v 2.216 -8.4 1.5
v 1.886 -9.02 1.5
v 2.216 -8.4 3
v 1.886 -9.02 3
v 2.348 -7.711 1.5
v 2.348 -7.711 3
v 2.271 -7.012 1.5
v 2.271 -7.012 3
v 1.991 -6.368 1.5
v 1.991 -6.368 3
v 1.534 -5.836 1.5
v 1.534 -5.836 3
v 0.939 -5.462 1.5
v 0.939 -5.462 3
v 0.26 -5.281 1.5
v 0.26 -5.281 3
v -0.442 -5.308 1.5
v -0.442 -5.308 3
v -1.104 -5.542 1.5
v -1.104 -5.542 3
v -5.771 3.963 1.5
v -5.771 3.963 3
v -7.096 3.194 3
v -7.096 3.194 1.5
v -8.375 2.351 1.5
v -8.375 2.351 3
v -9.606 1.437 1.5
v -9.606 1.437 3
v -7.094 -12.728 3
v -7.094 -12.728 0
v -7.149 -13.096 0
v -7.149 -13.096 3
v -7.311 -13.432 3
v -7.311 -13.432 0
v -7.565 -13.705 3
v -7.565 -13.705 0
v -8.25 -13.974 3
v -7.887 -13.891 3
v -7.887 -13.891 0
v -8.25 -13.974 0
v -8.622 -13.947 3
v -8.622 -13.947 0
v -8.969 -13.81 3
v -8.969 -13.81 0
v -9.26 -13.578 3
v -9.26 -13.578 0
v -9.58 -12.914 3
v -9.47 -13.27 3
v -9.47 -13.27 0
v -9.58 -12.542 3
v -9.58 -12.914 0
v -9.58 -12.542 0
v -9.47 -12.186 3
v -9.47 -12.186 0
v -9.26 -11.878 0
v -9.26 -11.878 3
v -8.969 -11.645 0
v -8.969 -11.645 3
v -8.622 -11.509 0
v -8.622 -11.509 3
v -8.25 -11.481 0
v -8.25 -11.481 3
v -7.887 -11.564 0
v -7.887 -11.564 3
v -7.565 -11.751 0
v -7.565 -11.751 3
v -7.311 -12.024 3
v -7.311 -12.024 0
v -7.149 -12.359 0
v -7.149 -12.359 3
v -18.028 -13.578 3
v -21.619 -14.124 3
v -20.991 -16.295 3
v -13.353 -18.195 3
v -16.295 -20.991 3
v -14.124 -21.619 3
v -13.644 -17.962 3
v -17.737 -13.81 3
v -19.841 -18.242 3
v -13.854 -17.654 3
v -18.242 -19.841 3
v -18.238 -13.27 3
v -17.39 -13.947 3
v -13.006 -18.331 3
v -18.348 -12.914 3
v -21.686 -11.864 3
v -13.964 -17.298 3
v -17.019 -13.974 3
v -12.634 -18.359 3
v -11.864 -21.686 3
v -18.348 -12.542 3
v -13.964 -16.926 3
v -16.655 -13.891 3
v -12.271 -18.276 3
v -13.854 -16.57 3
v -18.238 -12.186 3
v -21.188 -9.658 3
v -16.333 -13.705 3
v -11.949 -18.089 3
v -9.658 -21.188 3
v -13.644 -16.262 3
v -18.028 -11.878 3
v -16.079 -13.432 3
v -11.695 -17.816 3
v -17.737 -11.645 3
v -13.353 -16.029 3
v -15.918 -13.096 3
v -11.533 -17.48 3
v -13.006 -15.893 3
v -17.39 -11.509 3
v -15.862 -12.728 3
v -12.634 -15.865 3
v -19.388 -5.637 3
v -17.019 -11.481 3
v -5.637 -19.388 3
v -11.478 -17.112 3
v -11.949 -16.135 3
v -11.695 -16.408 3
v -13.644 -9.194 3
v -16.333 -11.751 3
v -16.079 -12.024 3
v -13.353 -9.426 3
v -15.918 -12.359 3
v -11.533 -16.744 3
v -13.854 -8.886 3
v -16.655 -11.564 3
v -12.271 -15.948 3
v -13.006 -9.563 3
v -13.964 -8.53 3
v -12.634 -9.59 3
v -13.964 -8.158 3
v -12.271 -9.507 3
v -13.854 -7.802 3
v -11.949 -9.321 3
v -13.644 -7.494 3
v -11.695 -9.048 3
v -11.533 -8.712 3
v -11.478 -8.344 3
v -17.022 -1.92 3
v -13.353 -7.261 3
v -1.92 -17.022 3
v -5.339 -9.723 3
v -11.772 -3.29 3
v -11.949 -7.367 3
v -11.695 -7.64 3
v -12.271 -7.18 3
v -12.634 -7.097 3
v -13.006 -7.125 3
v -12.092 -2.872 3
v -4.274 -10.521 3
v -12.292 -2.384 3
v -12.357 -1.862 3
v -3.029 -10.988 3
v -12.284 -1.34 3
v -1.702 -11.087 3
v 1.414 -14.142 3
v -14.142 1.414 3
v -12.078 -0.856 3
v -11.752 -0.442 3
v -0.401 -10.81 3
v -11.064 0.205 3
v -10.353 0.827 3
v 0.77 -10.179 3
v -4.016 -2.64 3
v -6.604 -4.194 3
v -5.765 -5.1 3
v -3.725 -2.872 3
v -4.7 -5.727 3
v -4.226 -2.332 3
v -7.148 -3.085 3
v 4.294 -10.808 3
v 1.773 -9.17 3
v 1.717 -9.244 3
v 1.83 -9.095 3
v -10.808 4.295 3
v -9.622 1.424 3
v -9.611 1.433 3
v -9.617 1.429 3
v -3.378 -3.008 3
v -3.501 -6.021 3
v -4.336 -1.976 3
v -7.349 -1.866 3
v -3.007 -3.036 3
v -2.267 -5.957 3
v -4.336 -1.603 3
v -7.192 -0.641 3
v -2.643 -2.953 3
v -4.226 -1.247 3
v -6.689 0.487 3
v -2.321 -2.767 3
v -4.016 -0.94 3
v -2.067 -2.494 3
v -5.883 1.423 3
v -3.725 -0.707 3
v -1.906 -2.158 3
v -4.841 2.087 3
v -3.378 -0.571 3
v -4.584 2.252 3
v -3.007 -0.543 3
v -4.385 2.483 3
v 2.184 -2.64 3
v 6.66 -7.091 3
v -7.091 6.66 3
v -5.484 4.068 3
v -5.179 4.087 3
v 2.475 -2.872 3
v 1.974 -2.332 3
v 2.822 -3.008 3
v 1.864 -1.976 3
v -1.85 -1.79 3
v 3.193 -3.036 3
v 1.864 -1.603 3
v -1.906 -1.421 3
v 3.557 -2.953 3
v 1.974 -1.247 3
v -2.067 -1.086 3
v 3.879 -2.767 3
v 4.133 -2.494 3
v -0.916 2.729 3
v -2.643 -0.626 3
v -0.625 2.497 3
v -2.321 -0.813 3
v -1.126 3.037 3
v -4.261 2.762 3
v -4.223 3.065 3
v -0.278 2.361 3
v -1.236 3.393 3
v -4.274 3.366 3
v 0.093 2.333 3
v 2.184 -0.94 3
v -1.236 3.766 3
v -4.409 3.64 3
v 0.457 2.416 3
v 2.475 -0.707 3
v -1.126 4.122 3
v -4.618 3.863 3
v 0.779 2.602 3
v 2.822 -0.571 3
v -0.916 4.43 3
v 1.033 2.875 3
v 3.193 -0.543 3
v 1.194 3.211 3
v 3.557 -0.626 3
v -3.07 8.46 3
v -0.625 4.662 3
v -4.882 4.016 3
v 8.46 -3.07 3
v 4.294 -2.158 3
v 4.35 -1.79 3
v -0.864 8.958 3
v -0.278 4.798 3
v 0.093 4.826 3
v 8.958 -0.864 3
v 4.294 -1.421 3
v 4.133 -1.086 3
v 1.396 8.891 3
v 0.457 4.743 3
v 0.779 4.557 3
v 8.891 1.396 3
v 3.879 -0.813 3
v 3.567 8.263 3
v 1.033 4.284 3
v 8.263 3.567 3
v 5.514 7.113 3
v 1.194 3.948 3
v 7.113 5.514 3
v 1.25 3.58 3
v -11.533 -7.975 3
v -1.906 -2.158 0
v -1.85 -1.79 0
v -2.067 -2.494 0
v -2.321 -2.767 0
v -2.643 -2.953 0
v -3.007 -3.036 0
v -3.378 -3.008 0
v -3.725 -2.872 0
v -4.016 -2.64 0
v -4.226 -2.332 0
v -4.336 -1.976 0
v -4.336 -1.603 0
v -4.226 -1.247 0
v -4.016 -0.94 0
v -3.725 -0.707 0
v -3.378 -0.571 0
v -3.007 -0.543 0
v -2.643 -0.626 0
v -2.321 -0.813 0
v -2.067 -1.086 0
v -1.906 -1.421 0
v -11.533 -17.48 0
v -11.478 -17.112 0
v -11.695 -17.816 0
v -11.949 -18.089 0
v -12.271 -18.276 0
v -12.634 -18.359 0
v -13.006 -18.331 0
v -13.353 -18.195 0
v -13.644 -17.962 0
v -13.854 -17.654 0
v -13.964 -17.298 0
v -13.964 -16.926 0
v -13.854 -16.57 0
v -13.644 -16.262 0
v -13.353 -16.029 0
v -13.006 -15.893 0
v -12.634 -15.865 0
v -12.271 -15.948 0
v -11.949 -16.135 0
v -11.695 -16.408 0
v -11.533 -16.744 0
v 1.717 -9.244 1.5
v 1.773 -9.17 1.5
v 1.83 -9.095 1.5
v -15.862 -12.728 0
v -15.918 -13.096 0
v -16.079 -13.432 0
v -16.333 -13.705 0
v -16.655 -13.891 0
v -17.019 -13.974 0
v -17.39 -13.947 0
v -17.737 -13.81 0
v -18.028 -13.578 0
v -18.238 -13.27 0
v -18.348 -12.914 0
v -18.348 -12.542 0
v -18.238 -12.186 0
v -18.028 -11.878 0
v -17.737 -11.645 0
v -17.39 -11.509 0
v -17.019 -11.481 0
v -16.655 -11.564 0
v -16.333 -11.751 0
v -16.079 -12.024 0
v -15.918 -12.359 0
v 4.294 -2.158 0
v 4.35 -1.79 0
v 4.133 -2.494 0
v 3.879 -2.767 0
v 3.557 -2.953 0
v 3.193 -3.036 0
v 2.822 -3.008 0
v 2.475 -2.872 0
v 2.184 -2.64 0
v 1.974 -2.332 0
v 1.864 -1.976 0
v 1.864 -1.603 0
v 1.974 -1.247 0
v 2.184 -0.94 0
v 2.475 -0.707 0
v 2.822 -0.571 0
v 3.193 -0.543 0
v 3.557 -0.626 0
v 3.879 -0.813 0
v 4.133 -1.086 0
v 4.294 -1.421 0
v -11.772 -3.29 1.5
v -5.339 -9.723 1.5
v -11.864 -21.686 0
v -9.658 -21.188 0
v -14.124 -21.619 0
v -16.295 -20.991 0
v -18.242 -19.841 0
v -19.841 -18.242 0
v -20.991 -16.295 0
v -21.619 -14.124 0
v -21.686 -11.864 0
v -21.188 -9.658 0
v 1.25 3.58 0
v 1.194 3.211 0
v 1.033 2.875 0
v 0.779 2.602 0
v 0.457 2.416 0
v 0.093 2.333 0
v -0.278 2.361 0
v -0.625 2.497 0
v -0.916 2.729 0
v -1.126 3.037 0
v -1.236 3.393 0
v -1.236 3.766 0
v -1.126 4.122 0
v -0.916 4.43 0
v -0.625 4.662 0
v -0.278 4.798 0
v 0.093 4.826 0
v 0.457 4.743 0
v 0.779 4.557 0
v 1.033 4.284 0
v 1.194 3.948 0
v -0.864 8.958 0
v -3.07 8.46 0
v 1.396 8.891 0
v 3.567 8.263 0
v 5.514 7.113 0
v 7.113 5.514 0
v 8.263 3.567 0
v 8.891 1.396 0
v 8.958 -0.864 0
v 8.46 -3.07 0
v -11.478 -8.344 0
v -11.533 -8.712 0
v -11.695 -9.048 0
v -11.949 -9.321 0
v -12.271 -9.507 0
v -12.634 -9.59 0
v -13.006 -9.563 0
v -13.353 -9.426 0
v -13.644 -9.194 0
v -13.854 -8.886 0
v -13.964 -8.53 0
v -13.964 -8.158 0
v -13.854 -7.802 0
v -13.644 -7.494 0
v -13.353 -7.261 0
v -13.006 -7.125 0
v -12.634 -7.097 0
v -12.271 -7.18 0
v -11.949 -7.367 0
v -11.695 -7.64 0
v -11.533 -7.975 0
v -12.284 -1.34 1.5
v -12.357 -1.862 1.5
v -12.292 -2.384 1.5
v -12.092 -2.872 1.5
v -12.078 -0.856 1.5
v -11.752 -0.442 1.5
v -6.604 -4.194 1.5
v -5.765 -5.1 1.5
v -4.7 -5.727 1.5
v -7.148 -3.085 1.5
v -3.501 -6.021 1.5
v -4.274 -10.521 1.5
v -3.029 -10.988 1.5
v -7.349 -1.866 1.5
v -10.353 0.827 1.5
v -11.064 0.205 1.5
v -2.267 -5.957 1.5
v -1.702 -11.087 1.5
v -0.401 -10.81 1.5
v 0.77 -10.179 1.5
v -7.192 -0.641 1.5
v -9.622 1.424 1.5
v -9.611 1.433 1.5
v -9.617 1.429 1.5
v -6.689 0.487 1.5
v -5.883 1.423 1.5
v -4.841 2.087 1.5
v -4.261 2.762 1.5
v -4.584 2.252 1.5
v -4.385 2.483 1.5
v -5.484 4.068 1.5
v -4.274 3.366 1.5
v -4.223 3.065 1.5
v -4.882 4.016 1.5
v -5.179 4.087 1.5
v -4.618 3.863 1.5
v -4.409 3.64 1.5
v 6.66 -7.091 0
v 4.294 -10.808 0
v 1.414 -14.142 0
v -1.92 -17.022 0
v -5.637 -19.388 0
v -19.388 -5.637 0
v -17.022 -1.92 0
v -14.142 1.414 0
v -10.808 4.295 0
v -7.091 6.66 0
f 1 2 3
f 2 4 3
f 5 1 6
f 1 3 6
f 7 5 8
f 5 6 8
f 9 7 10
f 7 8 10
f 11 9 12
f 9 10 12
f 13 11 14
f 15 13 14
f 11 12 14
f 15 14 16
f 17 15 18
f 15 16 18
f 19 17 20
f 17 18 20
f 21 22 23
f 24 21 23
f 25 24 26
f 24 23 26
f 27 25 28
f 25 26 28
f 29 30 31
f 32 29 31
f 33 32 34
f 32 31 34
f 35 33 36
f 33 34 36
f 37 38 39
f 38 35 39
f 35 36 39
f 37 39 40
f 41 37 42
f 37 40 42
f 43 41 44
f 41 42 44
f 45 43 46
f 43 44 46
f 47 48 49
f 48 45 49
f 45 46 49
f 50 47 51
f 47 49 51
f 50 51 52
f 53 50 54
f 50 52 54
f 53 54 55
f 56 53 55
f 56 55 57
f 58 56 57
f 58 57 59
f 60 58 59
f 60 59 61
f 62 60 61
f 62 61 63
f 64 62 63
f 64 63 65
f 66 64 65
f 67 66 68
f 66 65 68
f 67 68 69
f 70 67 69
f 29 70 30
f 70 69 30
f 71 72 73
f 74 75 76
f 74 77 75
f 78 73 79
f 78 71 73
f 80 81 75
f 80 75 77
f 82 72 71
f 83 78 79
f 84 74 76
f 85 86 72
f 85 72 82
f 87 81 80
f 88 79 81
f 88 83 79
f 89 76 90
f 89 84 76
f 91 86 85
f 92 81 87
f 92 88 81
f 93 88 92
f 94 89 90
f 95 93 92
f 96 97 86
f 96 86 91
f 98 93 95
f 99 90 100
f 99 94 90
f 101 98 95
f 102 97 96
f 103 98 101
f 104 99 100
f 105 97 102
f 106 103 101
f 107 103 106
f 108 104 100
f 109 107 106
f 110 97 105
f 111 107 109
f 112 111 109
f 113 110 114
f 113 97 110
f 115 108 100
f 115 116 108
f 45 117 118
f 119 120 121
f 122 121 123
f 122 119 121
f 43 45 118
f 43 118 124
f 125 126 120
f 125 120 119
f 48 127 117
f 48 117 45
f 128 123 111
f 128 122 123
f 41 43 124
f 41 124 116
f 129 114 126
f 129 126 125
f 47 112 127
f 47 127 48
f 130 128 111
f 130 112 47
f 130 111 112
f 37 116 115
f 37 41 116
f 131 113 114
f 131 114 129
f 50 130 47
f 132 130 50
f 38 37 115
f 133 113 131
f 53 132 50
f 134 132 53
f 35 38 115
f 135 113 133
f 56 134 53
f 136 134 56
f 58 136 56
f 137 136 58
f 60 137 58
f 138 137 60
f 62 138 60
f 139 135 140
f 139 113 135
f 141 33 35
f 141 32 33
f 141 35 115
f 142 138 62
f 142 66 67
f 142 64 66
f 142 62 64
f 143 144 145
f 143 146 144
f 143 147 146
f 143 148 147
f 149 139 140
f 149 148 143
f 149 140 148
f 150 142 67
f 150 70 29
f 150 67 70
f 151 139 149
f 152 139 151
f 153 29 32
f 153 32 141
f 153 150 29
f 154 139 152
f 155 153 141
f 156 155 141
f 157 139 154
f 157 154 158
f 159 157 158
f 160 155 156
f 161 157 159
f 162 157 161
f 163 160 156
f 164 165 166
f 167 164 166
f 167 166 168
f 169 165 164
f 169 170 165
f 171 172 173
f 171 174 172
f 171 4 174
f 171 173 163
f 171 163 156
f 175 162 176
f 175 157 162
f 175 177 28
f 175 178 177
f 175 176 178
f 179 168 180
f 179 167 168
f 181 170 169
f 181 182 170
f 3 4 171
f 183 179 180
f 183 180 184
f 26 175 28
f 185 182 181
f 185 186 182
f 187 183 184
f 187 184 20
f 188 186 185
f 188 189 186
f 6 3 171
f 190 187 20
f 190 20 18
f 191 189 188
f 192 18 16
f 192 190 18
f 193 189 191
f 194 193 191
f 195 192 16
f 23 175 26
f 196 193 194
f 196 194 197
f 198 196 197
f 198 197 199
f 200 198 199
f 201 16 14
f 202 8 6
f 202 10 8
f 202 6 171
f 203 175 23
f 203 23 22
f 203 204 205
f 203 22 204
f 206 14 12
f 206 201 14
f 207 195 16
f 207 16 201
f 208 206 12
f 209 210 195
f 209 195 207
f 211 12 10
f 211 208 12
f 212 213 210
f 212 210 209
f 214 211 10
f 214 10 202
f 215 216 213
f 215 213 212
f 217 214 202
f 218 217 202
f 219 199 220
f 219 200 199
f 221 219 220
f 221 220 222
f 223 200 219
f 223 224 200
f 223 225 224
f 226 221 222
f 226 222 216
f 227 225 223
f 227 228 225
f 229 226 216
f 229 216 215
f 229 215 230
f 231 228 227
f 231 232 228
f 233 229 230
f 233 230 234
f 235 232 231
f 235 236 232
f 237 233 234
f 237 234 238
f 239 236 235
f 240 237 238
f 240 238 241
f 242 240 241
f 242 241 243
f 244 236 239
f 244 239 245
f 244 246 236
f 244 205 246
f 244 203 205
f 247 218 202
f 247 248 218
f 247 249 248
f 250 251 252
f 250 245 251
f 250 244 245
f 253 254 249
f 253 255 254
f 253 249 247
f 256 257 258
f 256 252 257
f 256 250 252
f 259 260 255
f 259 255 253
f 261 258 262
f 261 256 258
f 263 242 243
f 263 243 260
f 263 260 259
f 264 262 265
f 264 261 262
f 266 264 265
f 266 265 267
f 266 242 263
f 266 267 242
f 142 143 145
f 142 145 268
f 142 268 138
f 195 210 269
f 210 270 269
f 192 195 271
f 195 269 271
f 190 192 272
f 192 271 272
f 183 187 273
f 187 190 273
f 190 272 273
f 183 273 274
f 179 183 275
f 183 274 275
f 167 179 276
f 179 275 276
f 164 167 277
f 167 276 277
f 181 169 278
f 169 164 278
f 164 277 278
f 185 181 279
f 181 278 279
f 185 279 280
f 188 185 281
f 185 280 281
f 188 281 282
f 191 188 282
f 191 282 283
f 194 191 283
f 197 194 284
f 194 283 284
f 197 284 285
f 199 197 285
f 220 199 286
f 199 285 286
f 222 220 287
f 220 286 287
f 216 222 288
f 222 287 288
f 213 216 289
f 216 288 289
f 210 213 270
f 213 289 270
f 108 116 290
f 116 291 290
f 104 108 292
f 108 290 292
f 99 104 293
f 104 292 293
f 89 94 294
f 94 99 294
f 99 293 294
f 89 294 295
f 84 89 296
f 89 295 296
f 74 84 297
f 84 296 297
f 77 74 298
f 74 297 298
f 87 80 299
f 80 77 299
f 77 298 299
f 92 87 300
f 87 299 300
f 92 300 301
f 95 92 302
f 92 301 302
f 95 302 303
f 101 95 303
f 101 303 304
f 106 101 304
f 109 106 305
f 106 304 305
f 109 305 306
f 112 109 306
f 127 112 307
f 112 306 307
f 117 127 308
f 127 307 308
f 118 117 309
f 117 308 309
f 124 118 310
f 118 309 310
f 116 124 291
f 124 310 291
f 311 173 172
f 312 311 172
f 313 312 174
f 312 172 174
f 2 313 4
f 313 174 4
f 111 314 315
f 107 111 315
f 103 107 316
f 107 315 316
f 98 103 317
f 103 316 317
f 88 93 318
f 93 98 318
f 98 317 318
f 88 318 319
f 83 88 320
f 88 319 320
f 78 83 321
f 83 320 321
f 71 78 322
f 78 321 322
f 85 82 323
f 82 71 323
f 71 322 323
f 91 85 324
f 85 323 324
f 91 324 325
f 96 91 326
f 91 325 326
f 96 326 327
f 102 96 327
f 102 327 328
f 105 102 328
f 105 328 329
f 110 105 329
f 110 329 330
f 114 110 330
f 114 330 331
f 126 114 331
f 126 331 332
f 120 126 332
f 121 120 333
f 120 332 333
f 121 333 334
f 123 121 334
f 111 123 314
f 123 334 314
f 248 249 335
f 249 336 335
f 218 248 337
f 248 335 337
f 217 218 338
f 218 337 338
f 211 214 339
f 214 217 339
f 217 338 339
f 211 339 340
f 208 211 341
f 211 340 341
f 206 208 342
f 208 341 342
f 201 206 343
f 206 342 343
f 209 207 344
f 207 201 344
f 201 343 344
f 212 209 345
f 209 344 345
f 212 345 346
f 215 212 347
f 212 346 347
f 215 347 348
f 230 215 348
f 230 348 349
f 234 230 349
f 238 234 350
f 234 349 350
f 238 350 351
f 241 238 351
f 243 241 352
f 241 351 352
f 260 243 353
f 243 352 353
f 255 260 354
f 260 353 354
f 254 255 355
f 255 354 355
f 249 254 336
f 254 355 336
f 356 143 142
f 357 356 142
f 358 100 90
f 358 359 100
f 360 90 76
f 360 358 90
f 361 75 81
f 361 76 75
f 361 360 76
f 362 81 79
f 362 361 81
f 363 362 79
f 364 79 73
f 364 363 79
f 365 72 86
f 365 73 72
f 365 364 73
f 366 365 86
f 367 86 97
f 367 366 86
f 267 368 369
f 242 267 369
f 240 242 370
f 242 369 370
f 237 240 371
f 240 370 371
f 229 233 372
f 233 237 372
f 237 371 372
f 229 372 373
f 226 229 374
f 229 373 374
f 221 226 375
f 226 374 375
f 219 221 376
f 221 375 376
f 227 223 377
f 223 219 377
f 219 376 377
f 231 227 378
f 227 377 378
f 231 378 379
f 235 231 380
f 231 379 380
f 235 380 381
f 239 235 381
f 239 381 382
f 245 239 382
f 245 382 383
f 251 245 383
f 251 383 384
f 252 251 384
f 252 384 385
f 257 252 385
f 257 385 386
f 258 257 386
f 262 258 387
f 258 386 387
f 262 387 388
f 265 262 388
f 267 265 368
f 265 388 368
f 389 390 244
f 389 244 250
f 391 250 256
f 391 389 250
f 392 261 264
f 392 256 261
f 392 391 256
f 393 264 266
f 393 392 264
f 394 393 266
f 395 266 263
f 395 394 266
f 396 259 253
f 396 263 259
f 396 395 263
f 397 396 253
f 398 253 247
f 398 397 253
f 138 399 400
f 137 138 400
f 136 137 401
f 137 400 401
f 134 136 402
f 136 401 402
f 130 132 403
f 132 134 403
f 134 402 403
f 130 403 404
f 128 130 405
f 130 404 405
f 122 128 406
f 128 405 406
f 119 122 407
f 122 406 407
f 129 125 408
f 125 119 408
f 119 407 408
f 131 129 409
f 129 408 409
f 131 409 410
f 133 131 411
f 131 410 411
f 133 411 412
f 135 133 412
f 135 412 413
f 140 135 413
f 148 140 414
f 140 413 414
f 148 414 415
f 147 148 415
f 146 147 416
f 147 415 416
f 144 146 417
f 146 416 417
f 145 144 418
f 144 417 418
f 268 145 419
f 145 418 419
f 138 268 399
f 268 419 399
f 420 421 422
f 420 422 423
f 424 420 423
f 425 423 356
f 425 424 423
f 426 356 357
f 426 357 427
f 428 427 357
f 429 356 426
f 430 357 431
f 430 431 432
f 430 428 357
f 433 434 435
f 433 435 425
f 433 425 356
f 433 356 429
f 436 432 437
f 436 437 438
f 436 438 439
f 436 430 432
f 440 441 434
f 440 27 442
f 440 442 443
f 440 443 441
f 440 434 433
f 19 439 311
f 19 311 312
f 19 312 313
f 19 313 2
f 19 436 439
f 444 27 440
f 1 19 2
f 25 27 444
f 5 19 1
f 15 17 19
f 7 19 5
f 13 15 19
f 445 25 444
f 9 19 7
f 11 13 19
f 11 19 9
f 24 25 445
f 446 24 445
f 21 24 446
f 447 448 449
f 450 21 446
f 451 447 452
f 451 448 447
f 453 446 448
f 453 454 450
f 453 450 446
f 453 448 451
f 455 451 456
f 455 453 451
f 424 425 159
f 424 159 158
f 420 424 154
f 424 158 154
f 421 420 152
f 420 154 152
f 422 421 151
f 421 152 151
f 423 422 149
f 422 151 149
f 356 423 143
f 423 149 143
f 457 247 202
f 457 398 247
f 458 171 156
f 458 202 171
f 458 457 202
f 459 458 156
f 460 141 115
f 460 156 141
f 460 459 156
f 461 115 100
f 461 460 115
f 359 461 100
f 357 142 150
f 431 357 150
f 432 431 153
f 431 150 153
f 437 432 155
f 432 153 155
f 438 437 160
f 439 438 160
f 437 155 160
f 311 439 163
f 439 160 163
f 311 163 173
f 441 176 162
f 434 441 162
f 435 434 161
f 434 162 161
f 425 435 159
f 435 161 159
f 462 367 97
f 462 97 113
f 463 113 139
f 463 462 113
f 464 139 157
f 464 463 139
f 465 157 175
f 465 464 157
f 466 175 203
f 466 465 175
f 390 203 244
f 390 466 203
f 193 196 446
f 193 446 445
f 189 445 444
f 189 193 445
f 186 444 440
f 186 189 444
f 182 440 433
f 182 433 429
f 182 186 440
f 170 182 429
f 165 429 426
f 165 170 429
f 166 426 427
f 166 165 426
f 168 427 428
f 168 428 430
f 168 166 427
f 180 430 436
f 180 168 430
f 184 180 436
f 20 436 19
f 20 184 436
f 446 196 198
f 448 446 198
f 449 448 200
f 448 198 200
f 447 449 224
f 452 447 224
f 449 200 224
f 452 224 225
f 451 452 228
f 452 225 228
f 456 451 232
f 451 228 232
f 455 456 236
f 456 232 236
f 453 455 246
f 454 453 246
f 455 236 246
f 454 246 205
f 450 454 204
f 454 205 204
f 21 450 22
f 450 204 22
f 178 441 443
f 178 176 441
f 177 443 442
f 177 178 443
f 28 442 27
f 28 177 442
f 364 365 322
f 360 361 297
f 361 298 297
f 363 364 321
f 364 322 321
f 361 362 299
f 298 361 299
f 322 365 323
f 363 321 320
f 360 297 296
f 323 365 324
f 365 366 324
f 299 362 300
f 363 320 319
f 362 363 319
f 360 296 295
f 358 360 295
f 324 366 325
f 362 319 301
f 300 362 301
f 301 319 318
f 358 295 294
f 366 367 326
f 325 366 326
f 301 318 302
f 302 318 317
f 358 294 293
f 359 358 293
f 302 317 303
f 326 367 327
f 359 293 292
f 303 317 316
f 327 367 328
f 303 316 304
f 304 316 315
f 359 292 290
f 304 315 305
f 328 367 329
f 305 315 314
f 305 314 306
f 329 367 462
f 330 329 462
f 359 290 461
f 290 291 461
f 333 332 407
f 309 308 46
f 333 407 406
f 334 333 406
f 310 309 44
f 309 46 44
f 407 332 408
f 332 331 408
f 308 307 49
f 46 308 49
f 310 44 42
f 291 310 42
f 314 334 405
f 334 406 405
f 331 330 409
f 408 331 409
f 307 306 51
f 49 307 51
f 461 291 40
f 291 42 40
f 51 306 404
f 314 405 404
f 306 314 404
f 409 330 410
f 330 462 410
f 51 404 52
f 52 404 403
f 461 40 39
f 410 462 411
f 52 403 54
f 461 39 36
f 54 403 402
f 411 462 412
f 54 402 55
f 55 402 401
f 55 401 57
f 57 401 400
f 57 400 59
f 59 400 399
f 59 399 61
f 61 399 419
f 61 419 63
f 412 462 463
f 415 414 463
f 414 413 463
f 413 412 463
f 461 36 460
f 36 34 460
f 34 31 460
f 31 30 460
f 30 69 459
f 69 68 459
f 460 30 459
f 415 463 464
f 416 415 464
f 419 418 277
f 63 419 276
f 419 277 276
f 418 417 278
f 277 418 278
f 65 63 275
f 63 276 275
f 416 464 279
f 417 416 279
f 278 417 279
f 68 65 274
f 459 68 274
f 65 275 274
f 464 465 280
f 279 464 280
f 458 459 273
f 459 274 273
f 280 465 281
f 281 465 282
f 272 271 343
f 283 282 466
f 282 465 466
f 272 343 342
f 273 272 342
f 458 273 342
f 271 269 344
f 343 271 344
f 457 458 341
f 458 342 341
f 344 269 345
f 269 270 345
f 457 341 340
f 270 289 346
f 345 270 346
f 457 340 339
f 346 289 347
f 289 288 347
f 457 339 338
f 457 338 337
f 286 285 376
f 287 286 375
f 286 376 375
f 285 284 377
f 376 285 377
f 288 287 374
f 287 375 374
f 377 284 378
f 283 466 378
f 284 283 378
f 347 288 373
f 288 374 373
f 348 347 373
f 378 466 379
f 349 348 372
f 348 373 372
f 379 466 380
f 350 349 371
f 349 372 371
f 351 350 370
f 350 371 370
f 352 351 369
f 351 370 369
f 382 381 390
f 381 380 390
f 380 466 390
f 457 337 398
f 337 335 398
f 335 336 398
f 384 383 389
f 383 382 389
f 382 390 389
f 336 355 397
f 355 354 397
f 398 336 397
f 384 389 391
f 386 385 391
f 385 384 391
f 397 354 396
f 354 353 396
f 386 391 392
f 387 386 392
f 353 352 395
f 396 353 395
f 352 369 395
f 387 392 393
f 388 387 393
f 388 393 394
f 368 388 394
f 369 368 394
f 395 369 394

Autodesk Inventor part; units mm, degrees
ref_plane "YZ Plane" through (0, 0, 0) normal (1, 0, 0) x (0, 1, 0)
ref_plane "XZ Plane" through (0, 0, 0) normal (0, 1, 0) x (-1, 0, 0)
ref_plane "XY Plane" through (0, 0, 0) normal (0, 0, 1) x (1, 0, 0)
sketch "Sketch2" plane through (0, 0, 0) normal (0, 0, 1) x (1, 0, 0)
  line L0 (-12.7279, -12.7279) -> (0, 0) construction
  line L1 (-12.7279, -12.7279) -> (-7.4558, -12.7279) construction
  line L2 (-12.7279, -12.7279) -> (0, 0) construction
  line L3 (-17.252, -29.9799) -> (-9.2664, -21.9943) construction
  line L4 (-2.9446, 9.7833) -> (-10.9302, 1.7977) construction
  arc A0 (-21.1882, -9.6582) -> (-9.6582, -21.1882) centre (-12.7279, -12.7279) ccw
  arc A1 (8.4603, -3.0697) -> (-3.0697, 8.4603) centre (0, 0) ccw
  circle A2 centre (-8.3439, -12.7279) radius 1.25
  circle A3 centre (-8.3439, -12.7279) radius 3.1 construction
  circle A4 centre (-12.7279, -8.3439) radius 1.25
  circle A5 centre (-12.7279, -8.3439) radius 3.1 construction
  circle A6 centre (-17.112, -12.7279) radius 1.25
  circle A7 centre (-17.112, -12.7279) radius 3.1 construction
  circle A8 centre (-12.7279, -17.112) radius 1.25
  circle A9 centre (-12.7279, -17.112) radius 3.1 construction
  circle A10 centre (-3.1, -1.7898) radius 1.25
  circle A11 centre (-3.1, -1.7898) radius 3.1 construction
  circle A12 centre (3.1, -1.7898) radius 3.1 construction
  circle A13 centre (3.1, -1.7898) radius 1.25
  circle A14 centre (0, 3.5796) radius 3.1 construction
  circle A15 centre (0, 3.5796) radius 1.25
  arc A16 (-9.6582, -21.1882) -> (8.4603, -3.0697) centre (-19.9758, 7.2478) ccw
  line L5 (1.4142, -14.1421) -> (-6.364, -6.364) construction
  arc A17 (-3.0697, 8.4603) -> (-21.1882, -9.6582) centre (7.2478, -19.9758) ccw
  point P0 (-6.364, -6.364)
  dimension "d34" = 18
  dimension "d35" = 9
  dimension "d36" = 2.5
  dimension "d37" = 6.2
  dimension "d38" = 360
  dimension "d39" = 2.5
  dimension "d40" = 6.2
  dimension "d41" = 360
  dimension "d42" = 11
  dimension "d43" = 45
extrude "Extrusion2" add sketch "Sketch2" along normal blind 3
sketch "Sketch3" plane through (0, 0, 3) normal (0, 0, 1) x (1, 0, 0)
  circle A0 centre (-12.7279, -8.3439) radius 1.25 projected
  circle A1 centre (-8.3439, -12.7279) radius 1.25 projected
  arc A2 (-3.0697, 8.4603) -> (-21.1882, -9.6582) centre (7.2478, -19.9758) ccw projected
  arc A3 (-9.6582, -21.1882) -> (8.4603, -3.0697) centre (-19.9758, 7.2478) ccw projected
  circle A4 centre (-3.1, -1.7898) radius 1.25 projected
  circle A5 centre (3.1, -1.7898) radius 1.25 projected
  circle A6 centre (0, 3.5796) radius 1.25 projected
  arc A7 (-9.6056, 1.4374) -> (-9.622, 1.4245) centre (7.2478, -19.9758) ccw
  circle A8 centre (-12.7279, -8.3439) radius 1.25 projected
  line L0 (-11.844, -7.46) -> (-7.46, -11.844) construction
  arc A9 (1.7167, -9.2445) -> (1.8856, -9.02) centre (-19.9758, 7.2478) ccw
  line L1 (-11.7716, -3.2898) -> (-5.3387, -9.7227)
  line L2 (-5.8854, -0.7722) -> (-0.4613, -6.1962) construction
  arc A10 (1.8856, -9.02) -> (-1.1039, -5.5419) centre (0, -7.6169) ccw
  arc A11 (-5.3387, -9.7227) -> (1.7167, -9.2445) centre (-2.0197, -6.4038) ccw
  circle A12 centre (-8.3439, -12.7279) radius 4.25 construction
  circle A13 centre (-3.1, -1.7898) radius 4.25 construction
  circle A14 centre (3.1, -1.7898) radius 4.25 construction
  circle A15 centre (-12.7279, -8.3439) radius 4.25 construction
  arc A16 (-11.7519, -0.4419) -> (-11.7716, -3.2898) centre (-10.3574, -1.8755) ccw
  arc A17 (-7.1444, 3.1635) -> (-14.769, -3.9189) centre (7.2478, -19.9758) ccw construction
  arc A18 (-4.8412, 2.0872) -> (-1.1039, -5.5419) centre (-3.1, -1.7898) ccw
  arc A19 (-5.7709, 3.9632) -> (-11.7519, -0.4419) centre (7.2478, -19.9758) ccw
  arc A20 (-4.8412, 2.0872) -> (-5.7709, 3.9632) centre (-5.2704, 3.0429) ccw
  circle A21 centre (0, 3.5796) radius 4.25 construction
  point P0 (0, 0)
  point P1 (-1.1039, -5.5419)
  dimension "d46" = 3
  dimension "d49" = 3
  dimension "d52" = 3
  dimension "d53" = 3
  dimension "d54" = 3
  dimension "d55" = 3
  dimension "d56" = 3
  dimension "d59" = 3
  dimension "d60" = 2
extrude "Extrusion3" cut sketch "Sketch3" against normal blind 1.5 contours A19 A20 A18 A10 A9 A11 L1 A16 A7
sketch "sesaku" plane through (0, 0, 3) normal (0, 0, 1) x (1, 0, 0)
  arc A0 (-5.3387, -9.7227) -> (1.7167, -9.2445) centre (-2.0197, -6.4038) ccw projected
  line L0 (-5.3387, -9.7227) -> (-11.7716, -3.2898) projected
  arc A1 (-11.7519, -0.4419) -> (-11.7716, -3.2898) centre (-10.3574, -1.8755) ccw projected
  arc A2 (1.8856, -9.02) -> (-1.1039, -5.5419) centre (0, -7.6169) ccw projected
  arc A3 (1.7167, -9.2445) -> (1.8856, -9.02) centre (-19.9758, 7.2478) ccw projected
  arc A4 (-9.6582, -21.1882) -> (8.4603, -3.0697) centre (-19.9758, 7.2478) ccw projected
  arc A5 (8.4603, -3.0697) -> (-3.0697, 8.4603) centre (0, 0) ccw projected
  arc A6 (-3.0697, 8.4603) -> (-21.1882, -9.6582) centre (7.2478, -19.9758) ccw projected
  arc A7 (-21.1882, -9.6582) -> (-9.6582, -21.1882) centre (-12.7279, -12.7279) ccw projected
  circle A8 centre (0, 3.5796) radius 1.25 projected
  circle A9 centre (3.1, -1.7898) radius 1.25 projected
  circle A10 centre (-3.1, -1.7898) radius 1.25 projected
  circle A11 centre (-12.7279, -17.112) radius 1.25 projected
  circle A12 centre (-17.112, -12.7279) radius 1.25 projected
  circle A13 centre (-12.7279, -8.3439) radius 1.25 projected
  circle A14 centre (-8.3439, -12.7279) radius 1.25 projected
  arc A15 (-5.7709, 3.9632) -> (-11.7519, -0.4419) centre (7.2478, -19.9758) ccw projected
  arc A16 (-4.8412, 2.0872) -> (-5.7709, 3.9632) centre (-5.2704, 3.0429) ccw projected
  arc A17 (-4.8412, 2.0872) -> (-1.1039, -5.5419) centre (-3.1, -1.7898) ccw projected
properties part number "駆動節" material "Aluminum 2014-T6"
